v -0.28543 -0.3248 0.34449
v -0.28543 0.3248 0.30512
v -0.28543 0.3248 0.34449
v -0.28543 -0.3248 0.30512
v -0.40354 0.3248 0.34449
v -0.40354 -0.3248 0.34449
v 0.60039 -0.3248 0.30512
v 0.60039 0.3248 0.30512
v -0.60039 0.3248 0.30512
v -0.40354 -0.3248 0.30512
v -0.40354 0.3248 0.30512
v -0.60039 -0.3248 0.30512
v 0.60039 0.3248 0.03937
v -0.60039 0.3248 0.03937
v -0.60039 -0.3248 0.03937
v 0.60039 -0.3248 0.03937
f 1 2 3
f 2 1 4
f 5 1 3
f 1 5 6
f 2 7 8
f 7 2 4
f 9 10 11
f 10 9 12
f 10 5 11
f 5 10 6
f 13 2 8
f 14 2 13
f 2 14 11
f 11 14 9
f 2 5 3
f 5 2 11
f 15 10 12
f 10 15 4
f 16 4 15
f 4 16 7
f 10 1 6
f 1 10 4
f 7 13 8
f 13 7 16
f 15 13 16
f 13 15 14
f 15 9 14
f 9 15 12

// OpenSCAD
// file: defines.scad
A = 3.25;   // 3.00...3.50
B = 1.65;   // 1.50...1.80
C = 0.875;  // 0.45...0.75
D = 0.6;    // 0.10...0.75
E = 0.01;
/*E = 0.45;   // 0.25...0.65*/

pt = 0.1; // Толщина элеметов (дорожек, краски и т.п)
lab_mark = 0.3; // Полоска
plw = 0.02; // Толщина лужения

$fn = 32;

scale = 1/2.54;
// main file
include <defines.scad>


scale(scale)
  color([0.15,0.15,0.15])
    union(){
      translate([-A/2+D, -B/2, C-pt]) cube([lab_mark, B, pt]);
        translate([-A/2+pt, -B/2, pt]) cube([A-2*pt, B, C-pt-pt]);
    }
